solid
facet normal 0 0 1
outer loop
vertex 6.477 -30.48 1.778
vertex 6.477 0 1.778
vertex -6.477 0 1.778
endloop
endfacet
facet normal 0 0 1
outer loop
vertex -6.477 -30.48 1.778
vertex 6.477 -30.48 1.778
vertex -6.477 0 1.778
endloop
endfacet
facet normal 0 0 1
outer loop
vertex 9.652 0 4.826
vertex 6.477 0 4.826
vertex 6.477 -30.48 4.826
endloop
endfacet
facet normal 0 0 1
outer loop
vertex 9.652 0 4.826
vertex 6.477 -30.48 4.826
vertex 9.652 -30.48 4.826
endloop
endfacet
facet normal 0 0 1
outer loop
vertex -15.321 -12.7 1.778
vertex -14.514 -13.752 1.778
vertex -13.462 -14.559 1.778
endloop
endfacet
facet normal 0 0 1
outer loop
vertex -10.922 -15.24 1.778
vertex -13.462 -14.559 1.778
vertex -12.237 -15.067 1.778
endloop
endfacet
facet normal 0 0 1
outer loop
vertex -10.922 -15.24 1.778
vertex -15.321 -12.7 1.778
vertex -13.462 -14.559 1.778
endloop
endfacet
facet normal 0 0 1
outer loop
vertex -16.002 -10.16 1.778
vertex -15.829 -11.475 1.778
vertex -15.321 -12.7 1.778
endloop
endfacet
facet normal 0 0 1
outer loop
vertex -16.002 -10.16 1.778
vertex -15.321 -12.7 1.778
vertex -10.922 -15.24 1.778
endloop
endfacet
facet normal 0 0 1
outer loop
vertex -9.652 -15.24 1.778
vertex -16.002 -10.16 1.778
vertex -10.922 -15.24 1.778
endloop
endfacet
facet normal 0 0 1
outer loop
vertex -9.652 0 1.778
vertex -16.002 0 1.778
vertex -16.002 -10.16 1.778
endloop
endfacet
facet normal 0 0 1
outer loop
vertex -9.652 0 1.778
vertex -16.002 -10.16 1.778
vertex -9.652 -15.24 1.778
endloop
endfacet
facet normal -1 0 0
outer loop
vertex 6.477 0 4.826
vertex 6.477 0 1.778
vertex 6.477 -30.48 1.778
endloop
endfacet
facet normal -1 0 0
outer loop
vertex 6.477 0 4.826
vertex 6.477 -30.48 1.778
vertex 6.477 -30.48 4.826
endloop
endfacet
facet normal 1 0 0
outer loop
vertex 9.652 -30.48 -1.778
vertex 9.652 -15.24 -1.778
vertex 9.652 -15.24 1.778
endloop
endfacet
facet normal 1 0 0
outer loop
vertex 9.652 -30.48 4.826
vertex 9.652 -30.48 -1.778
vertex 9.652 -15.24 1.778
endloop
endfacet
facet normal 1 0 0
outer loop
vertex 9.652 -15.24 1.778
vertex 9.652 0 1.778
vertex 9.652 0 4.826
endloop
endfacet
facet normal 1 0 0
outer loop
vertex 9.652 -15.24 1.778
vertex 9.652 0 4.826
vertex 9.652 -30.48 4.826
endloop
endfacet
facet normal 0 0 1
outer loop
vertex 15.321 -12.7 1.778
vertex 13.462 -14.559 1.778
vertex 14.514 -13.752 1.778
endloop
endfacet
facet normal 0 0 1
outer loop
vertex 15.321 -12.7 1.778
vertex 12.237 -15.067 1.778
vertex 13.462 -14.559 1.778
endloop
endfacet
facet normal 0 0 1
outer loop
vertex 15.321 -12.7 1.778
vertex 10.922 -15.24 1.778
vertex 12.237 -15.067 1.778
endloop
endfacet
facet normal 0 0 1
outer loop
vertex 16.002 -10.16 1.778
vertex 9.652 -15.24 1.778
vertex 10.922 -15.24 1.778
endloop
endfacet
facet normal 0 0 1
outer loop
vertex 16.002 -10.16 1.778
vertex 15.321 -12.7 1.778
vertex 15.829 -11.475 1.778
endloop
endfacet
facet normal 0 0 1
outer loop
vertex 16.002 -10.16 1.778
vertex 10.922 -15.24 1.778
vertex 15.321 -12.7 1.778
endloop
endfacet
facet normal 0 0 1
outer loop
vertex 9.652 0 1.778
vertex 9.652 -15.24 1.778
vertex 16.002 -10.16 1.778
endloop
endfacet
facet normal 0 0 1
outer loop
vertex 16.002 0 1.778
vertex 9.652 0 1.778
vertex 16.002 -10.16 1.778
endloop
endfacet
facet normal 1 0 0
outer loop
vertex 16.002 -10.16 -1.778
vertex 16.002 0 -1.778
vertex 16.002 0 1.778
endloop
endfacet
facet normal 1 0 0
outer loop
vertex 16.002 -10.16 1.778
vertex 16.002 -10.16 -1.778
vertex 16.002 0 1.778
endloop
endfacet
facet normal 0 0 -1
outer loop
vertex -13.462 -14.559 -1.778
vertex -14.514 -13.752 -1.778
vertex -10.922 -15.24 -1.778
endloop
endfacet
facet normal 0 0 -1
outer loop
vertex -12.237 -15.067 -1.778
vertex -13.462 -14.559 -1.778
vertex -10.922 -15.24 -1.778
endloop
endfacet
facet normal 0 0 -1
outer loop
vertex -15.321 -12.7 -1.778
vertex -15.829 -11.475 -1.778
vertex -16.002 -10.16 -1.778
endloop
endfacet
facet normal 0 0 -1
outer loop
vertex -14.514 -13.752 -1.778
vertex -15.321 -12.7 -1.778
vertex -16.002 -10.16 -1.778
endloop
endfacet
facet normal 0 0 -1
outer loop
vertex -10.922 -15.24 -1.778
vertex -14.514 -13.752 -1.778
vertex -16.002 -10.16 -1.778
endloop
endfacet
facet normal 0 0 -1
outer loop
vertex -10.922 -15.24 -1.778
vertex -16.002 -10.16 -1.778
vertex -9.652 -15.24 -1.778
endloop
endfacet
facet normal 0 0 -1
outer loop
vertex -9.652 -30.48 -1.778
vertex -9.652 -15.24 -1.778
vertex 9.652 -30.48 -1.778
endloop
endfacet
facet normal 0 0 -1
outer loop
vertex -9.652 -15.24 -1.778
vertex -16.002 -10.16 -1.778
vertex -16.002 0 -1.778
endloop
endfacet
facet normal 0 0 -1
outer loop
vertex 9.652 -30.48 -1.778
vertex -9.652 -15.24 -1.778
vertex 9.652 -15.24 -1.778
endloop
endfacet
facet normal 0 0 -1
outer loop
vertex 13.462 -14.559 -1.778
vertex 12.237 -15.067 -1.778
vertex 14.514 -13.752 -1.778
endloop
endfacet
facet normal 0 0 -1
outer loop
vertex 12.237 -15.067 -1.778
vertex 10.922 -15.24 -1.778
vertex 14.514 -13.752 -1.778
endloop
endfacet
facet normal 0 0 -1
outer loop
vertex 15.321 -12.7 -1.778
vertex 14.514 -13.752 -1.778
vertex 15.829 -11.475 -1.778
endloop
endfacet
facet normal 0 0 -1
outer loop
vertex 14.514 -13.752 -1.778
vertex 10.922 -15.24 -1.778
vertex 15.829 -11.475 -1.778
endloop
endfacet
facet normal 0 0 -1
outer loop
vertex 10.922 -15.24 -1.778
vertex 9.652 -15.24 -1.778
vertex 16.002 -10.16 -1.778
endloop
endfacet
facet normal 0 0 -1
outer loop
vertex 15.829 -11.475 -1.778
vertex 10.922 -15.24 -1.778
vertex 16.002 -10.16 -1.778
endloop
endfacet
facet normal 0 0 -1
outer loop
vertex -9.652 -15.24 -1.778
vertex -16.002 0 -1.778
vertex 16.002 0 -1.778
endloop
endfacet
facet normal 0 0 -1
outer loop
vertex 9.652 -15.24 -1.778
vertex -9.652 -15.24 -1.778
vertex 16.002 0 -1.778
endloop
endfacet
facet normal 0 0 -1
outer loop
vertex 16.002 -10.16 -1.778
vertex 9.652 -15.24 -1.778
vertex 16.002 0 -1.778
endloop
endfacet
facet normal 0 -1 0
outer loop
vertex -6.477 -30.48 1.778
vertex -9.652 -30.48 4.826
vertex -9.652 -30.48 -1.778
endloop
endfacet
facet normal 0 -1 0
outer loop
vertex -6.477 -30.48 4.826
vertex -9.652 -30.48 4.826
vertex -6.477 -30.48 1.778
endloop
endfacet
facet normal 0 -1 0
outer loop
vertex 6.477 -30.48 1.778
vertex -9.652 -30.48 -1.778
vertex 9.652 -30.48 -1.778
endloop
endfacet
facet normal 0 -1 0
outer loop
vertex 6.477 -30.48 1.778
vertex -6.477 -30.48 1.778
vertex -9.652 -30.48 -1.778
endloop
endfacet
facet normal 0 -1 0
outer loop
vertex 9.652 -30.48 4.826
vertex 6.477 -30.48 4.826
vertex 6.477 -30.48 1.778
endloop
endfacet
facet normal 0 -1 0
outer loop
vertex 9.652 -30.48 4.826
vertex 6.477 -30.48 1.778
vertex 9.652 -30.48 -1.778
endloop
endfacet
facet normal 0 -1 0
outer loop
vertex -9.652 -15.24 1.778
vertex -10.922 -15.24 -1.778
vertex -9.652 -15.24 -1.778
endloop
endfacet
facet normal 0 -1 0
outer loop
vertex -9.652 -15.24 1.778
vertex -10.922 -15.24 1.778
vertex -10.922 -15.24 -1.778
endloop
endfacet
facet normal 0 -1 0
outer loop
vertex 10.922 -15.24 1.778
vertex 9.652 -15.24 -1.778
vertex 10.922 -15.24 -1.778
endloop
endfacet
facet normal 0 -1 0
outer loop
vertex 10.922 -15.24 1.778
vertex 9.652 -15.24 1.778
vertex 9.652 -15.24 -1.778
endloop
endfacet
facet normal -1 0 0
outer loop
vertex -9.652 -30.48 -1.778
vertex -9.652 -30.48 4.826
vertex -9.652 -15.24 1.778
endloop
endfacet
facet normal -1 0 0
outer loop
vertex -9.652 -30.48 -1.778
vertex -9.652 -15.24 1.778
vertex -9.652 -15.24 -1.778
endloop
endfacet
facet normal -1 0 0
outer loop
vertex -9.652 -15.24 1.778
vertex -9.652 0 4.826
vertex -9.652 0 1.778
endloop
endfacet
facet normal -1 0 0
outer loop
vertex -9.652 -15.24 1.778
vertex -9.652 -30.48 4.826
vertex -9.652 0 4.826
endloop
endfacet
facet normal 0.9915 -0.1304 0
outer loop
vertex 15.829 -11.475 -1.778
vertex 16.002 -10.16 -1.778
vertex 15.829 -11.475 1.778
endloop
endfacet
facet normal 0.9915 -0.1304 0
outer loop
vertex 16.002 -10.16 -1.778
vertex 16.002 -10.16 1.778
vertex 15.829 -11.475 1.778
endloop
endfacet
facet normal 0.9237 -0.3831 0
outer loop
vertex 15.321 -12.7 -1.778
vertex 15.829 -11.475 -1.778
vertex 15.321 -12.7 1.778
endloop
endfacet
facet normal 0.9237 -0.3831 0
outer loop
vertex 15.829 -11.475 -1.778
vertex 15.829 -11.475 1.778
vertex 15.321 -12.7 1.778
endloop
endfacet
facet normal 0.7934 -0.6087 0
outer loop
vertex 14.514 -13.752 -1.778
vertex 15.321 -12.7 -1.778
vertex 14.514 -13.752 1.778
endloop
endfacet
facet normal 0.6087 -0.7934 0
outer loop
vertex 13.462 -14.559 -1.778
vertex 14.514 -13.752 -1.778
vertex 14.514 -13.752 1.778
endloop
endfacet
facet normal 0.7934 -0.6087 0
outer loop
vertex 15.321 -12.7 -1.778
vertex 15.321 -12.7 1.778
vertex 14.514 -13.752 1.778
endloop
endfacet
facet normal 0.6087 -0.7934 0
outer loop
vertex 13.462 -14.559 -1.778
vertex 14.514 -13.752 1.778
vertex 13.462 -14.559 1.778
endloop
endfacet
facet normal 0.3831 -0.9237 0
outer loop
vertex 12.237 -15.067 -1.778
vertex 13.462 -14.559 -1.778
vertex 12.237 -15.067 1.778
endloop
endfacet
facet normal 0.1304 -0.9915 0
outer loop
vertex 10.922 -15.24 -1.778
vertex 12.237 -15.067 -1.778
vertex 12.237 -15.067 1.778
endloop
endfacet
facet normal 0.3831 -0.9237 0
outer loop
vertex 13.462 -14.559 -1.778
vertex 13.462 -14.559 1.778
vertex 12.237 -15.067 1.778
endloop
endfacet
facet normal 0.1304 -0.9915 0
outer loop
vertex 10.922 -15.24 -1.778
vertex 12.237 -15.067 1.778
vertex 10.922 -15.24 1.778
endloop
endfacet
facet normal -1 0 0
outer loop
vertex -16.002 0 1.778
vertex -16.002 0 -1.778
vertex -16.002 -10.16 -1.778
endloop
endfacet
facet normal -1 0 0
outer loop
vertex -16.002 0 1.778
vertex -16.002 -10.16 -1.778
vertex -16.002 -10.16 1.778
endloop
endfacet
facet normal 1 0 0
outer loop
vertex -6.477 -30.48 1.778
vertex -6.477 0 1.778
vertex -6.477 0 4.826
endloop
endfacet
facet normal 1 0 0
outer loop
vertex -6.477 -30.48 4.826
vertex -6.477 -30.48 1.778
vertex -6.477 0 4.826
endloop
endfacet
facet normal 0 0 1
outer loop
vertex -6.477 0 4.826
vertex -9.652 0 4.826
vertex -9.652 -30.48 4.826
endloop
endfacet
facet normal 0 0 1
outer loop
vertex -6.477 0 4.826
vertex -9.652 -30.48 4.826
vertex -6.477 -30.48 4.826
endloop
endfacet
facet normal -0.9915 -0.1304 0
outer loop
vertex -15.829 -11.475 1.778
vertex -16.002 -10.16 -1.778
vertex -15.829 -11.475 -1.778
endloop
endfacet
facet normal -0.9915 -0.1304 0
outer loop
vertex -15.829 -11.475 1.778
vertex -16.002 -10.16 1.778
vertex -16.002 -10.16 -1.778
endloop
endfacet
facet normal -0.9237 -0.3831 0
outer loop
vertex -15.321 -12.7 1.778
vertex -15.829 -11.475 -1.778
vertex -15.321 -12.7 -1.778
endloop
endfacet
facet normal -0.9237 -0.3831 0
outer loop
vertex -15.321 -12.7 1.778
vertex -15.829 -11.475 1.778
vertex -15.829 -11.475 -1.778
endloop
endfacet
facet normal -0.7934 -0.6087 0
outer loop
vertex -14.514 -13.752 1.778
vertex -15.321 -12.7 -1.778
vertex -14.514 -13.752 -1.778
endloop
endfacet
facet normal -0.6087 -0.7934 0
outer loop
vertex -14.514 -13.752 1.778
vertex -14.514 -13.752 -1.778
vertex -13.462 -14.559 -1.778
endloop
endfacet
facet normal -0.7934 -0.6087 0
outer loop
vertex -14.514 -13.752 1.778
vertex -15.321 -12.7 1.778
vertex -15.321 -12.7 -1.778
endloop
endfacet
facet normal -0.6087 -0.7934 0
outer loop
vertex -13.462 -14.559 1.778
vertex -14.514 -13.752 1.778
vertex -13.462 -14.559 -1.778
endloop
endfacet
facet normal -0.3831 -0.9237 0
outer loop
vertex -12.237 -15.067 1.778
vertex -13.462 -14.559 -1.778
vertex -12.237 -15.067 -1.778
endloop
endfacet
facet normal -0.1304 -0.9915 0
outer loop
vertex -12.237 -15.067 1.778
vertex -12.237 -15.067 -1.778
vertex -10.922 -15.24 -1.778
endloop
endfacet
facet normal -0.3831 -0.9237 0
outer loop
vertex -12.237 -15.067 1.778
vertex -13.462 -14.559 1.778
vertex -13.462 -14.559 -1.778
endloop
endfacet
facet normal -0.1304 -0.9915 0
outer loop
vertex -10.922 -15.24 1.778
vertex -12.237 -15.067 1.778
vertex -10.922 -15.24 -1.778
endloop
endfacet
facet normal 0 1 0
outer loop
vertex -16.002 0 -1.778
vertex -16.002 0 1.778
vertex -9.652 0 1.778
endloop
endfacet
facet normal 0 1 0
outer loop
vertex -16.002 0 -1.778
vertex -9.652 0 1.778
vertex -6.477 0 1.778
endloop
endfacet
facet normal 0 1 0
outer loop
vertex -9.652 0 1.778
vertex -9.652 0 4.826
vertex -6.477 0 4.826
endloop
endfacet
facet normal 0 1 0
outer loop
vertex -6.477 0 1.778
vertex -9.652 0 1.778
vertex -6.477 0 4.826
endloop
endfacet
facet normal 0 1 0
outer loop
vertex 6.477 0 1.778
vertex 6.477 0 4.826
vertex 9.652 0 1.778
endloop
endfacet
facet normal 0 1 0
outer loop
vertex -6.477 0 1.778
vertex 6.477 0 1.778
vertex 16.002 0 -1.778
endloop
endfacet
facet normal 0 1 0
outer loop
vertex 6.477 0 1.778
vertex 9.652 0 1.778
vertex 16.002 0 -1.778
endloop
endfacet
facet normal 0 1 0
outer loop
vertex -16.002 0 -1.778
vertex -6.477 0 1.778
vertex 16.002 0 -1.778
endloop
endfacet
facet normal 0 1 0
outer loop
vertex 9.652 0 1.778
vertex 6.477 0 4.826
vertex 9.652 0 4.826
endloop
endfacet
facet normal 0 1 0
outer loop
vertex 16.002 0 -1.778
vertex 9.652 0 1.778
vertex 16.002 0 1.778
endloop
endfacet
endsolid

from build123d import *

# Parameters (mm, degrees)
F0_W     = 3.175
F0_H     = 3.048
F1_DEPTH = 30.48
F0_W_2   = 6.35
F0_H_2   = 3.556
F2_DEPTH = 15.24
F3_DEPTH = 15.24
F4_R     = 5.08


with BuildPart() as f1:
    # F0 (on Front) → F1 (new body)
    with BuildSketch(Plane.XZ):
        Polygon((9.652, -1.778), (9.652, 1.778), (6.477, 1.778), (-6.477, 1.778), (-9.652, 1.778), (-9.652, -1.778), align=None)
        with Locations((8.0645, 3.302)):
            Rectangle(F0_W, F0_H)
        with Locations((-8.0645, 3.302)):
            Rectangle(F0_W, F0_H)
    extrude(amount=F1_DEPTH)

    # F0 (on Front) → F2 (join)
    with BuildSketch(Plane.XZ):
        with Locations((12.827, 0)):
            Rectangle(F0_W_2, F0_H_2)
    extrude(amount=F2_DEPTH)

    # F0 (on Front) → F3 (join)
    with BuildSketch(Plane.XZ):
        with Locations((-12.827, 0)):
            Rectangle(F0_W_2, F0_H_2)
    extrude(amount=F3_DEPTH)

    # F4
    f4_edges = [f1.edges().sort_by_distance(p)[0] for p in [
        (-16.002, -15.24, 0),
        (16.002, -15.24, 0),
    ]]
    fillet(f4_edges, radius=F4_R)


solid = f1.part
